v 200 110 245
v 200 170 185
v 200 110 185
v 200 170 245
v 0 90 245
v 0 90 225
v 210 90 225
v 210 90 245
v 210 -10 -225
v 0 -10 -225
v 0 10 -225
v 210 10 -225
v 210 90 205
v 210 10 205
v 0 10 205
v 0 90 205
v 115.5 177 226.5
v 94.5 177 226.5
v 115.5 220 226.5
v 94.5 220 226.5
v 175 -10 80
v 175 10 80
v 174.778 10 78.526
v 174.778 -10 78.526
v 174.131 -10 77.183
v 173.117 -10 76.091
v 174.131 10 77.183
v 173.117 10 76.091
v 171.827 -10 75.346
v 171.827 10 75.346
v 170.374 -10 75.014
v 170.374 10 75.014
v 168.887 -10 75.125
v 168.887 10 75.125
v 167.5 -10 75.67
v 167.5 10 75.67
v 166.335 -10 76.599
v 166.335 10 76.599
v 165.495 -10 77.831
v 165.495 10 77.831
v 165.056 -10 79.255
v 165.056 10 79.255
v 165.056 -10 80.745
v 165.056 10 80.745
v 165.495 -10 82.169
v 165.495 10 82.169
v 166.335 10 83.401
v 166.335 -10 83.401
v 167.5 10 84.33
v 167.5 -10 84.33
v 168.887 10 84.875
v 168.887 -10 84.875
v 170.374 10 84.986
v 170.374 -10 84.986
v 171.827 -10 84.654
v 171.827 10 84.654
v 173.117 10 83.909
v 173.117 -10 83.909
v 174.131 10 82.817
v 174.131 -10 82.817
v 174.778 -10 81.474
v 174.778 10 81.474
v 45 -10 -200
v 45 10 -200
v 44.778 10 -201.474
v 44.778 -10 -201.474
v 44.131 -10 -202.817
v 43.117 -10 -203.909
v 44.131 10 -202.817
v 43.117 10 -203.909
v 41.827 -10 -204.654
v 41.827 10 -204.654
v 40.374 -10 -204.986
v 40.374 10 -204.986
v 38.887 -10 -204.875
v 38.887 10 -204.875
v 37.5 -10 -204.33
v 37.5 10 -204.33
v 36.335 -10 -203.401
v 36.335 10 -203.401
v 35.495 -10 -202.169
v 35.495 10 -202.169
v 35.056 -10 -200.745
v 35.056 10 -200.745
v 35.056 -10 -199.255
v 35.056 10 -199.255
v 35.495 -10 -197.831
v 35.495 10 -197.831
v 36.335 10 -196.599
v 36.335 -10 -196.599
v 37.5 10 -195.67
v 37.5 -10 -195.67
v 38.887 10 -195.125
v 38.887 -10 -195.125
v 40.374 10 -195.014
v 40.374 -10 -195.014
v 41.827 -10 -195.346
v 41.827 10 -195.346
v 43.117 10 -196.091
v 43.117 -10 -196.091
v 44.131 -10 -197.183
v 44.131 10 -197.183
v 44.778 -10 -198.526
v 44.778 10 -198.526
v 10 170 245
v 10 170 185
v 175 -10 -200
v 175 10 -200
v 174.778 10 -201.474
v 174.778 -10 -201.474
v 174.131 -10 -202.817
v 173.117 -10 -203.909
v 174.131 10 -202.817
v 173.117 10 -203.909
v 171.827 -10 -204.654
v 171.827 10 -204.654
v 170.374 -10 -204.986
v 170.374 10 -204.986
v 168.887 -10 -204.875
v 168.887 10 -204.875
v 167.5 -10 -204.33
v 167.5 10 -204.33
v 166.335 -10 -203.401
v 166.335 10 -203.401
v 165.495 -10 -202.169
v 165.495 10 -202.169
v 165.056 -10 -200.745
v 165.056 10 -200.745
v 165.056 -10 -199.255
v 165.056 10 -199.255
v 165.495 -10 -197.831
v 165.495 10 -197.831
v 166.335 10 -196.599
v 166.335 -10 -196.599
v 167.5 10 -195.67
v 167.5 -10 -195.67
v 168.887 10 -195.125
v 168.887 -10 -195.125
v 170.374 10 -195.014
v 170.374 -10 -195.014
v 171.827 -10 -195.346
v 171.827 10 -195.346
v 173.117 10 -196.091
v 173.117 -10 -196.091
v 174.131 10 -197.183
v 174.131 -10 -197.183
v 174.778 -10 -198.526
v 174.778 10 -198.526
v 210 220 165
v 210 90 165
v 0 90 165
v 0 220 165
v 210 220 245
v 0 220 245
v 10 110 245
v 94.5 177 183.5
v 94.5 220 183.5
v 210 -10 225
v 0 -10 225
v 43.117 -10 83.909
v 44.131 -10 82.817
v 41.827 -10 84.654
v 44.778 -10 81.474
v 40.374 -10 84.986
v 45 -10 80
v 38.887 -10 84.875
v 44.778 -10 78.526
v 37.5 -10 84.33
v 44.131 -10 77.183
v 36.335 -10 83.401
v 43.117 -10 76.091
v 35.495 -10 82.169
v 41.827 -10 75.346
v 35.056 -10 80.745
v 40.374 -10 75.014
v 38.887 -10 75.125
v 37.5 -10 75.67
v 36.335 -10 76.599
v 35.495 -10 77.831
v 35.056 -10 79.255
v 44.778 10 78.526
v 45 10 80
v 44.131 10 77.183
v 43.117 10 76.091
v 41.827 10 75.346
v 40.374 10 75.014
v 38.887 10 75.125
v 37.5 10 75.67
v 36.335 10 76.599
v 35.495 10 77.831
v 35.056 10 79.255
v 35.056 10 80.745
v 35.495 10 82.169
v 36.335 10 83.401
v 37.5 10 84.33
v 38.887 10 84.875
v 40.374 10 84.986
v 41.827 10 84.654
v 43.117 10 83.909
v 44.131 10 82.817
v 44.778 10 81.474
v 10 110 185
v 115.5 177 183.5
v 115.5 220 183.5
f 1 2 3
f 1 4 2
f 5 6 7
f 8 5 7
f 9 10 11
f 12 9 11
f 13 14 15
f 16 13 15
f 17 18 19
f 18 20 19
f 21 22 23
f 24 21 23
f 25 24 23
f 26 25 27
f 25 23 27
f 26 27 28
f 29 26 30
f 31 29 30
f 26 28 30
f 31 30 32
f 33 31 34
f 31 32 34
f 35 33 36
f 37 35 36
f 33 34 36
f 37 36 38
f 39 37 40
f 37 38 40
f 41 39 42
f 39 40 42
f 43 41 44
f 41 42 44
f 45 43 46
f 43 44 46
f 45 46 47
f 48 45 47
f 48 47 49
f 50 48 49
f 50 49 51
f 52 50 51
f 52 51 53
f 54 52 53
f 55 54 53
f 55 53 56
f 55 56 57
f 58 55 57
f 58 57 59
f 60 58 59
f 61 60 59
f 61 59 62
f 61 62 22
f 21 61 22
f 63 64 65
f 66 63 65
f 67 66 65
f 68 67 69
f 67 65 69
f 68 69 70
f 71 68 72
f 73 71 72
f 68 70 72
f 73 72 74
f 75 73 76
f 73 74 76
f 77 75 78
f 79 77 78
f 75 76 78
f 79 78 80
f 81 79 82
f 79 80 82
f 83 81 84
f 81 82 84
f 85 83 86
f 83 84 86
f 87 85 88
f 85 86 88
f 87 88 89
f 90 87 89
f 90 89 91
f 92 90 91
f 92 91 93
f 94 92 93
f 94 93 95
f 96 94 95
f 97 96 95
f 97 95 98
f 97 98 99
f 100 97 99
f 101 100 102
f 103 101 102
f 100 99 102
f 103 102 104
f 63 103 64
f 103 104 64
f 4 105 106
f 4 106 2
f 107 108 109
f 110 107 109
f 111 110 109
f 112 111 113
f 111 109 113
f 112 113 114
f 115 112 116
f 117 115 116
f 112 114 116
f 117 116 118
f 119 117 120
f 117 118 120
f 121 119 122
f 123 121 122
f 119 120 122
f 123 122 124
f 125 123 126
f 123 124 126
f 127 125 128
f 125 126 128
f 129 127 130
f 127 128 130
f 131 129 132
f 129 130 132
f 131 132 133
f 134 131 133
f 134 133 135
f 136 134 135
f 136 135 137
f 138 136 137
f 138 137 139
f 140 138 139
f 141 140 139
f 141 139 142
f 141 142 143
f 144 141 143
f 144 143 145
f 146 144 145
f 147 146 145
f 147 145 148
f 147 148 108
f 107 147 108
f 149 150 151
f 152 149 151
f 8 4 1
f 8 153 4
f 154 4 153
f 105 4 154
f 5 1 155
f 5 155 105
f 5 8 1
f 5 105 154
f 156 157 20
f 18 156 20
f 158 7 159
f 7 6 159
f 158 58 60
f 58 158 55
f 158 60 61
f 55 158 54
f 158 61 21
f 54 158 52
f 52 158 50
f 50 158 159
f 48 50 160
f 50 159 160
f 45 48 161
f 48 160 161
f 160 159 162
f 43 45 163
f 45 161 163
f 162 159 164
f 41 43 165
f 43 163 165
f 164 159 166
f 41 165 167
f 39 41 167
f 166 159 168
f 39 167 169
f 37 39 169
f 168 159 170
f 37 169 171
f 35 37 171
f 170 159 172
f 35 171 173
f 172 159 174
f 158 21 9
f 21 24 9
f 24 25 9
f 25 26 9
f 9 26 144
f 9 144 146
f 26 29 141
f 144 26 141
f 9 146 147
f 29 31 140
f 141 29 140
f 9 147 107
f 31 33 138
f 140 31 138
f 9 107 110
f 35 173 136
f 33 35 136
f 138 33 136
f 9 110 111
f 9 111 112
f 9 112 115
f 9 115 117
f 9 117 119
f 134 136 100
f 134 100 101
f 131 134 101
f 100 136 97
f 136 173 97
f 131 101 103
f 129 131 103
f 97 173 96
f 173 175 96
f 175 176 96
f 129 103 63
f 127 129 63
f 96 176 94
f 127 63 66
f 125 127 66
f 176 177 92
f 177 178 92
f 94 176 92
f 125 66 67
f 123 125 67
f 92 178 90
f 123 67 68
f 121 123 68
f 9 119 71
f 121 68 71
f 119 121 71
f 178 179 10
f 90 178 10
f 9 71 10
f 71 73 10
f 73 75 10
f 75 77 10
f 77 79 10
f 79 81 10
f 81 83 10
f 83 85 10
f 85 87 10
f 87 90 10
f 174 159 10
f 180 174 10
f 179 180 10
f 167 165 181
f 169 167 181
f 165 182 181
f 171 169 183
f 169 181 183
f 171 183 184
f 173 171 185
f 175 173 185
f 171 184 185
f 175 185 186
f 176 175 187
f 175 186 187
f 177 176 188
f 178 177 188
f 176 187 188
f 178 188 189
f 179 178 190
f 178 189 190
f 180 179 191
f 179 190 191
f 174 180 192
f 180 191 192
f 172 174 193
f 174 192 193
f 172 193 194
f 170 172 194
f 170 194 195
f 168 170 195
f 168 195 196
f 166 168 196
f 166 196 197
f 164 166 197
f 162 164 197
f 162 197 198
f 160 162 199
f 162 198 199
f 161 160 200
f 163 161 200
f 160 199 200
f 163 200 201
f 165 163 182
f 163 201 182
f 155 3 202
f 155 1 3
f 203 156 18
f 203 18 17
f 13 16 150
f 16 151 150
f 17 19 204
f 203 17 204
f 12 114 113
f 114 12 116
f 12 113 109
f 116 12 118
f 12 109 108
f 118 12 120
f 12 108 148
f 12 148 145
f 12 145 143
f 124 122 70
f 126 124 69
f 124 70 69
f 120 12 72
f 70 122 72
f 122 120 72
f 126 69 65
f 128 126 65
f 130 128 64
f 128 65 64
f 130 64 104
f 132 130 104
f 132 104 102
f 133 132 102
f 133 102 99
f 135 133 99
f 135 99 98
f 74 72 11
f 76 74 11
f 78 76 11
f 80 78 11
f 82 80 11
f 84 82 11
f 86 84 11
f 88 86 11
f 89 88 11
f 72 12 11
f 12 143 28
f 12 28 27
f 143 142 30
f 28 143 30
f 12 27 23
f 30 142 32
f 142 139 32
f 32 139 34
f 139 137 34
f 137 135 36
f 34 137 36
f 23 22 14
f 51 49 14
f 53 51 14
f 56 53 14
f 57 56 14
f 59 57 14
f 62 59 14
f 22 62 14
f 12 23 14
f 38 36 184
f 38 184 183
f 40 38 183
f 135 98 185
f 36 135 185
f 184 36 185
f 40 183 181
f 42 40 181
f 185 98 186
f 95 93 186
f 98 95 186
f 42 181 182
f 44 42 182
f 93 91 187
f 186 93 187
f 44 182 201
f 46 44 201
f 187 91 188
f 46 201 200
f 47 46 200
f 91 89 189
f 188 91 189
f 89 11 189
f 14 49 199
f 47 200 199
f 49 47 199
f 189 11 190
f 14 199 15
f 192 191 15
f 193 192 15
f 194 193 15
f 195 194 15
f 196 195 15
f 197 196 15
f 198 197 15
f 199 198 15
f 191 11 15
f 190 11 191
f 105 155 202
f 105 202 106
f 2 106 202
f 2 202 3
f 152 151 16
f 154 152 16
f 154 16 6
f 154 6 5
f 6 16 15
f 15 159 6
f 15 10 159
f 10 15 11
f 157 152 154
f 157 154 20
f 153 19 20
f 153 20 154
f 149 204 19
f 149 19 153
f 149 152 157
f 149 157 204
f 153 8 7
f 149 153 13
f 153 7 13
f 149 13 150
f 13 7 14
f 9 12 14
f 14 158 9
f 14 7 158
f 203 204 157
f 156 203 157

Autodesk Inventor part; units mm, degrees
ref_plane "YZ Plane" through (0, 0, 0) normal (1, 0, 0) x (0, 1, 0)
ref_plane "XZ Plane" through (0, 0, 0) normal (0, 1, 0) x (-1, 0, 0)
ref_plane "XY Plane" through (0, 0, 0) normal (0, 0, 1) x (1, 0, 0)
sketch "Boceto1" plane through (0, 0, 0) normal (1, 0, 0) x (0, 1, 0)
  line L0 (10, 225) -> (-10, 225)
  line L1 (-10, 225) -> (-10, -225)
  line L2 (-10, -225) -> (10, -225)
  line L3 (10, -225) -> (10, 225)
  line L4 (10, 225) -> (-10, -225) construction
  line L5 (-10, 225) -> (10, -225) construction
  point P0 (0, 0)
  dimension "d0" = 20
  dimension "d1" = 450
extrude "Extrusión1" add sketch "Boceto1" along normal blind 210
sketch "Boceto2" plane through (0, 10, 225) normal (0, 1, 0) x (1, 0, 0)
  line L0 (0, 0) -> (0, 450) projected
  line L1 (210, 0) -> (210, 450) projected
  line L2 (0, 0) -> (210, 0)
  line L3 (210, 0) -> (210, 20)
  line L4 (210, 20) -> (0, 20)
  line L5 (0, 20) -> (0, 0)
  point P0 (0, 225)
  dimension "d4" = 20
extrude "Extrusión2" add sketch "Boceto2" along normal blind 80
sketch "Boceto3" plane through (0, 90, 225) normal (0, 1, 0) x (1, 0, 0)
  line L0 (0, 0) -> (210, 0) projected
  line L1 (0, 0) -> (210, 0)
  line L2 (210, 0) -> (210, -20)
  line L3 (210, -20) -> (0, -20)
  line L4 (0, -20) -> (0, 0)
  line L5 (0, 0) -> (210, 0)
  line L6 (210, 0) -> (210, 60)
  line L7 (210, 60) -> (0, 60)
  line L8 (0, 60) -> (0, 0)
  point P0 (0, 225)
  dimension "d7" = 20
  dimension "d8" = 210
  dimension "d9" = 60
extrude "Extrusión3" add sketch "Boceto3" along normal blind 130
sketch "Boceto4" plane through (0, 90, 245) normal (0, 0, 1) x (1, 0, 0)
  line L0 (10, 80) -> (200, 80)
  line L1 (200, 80) -> (200, 20)
  line L2 (200, 20) -> (10, 20)
  line L3 (10, 20) -> (10, 80)
  point P0 (0, -90)
  point P1 (0, 130)
  point P2 (210, 0)
  dimension "d12" = 190
  dimension "d13" = 60
extrude "Extrusión4" cut sketch "Boceto4" against normal blind 60
sketch "Boceto5" plane through (0, 220, 225) normal (0, 1, 0) x (1, 0, 0)
  line L0 (94.5, -1.5) -> (115.5, -1.5)
  line L1 (115.5, -1.5) -> (115.5, 41.5)
  line L2 (115.5, 41.5) -> (94.5, 41.5)
  line L3 (94.5, 41.5) -> (94.5, -1.5)
  line L4 (94.5, -1.5) -> (115.5, 41.5) construction
  line L5 (115.5, -1.5) -> (94.5, 41.5) construction
  point P0 (0, 225)
  point P1 (105, 20)
  dimension "d18" = 21
  dimension "d19" = 43
extrude "Extrusión5" cut sketch "Boceto5" against normal blind 43
sketch "Boceto6" plane through (0, 10, -225) normal (0, 1, 0) x (1, 0, 0)
  circle A0 centre (40, -305) radius 5
  circle A1 centre (40, -25) radius 5
  circle A2 centre (170, -305) radius 5
  circle A3 centre (170, -25) radius 5
  line L0 (0, -470) -> (210, -470) projected
  line L1 (0, 0) -> (210, 0) projected
  line L2 (0, 0) -> (0, -430) projected
  line L3 (210, 0) -> (210, -430) projected
  point P0 (0, -225)
  dimension "d23" = 10
  dimension "d24" = 10
  dimension "d25" = 10
  dimension "d26" = 10
  dimension "d27" = 165
  dimension "d28" = 25
  dimension "d29" = 25
  dimension "d30" = 165
  dimension "d31" = 40
  dimension "d32" = 40
  dimension "d33" = 40
  dimension "d34" = 40
extrude "Extrusión6" cut sketch "Boceto6" against normal blind 43
properties part number "base"
